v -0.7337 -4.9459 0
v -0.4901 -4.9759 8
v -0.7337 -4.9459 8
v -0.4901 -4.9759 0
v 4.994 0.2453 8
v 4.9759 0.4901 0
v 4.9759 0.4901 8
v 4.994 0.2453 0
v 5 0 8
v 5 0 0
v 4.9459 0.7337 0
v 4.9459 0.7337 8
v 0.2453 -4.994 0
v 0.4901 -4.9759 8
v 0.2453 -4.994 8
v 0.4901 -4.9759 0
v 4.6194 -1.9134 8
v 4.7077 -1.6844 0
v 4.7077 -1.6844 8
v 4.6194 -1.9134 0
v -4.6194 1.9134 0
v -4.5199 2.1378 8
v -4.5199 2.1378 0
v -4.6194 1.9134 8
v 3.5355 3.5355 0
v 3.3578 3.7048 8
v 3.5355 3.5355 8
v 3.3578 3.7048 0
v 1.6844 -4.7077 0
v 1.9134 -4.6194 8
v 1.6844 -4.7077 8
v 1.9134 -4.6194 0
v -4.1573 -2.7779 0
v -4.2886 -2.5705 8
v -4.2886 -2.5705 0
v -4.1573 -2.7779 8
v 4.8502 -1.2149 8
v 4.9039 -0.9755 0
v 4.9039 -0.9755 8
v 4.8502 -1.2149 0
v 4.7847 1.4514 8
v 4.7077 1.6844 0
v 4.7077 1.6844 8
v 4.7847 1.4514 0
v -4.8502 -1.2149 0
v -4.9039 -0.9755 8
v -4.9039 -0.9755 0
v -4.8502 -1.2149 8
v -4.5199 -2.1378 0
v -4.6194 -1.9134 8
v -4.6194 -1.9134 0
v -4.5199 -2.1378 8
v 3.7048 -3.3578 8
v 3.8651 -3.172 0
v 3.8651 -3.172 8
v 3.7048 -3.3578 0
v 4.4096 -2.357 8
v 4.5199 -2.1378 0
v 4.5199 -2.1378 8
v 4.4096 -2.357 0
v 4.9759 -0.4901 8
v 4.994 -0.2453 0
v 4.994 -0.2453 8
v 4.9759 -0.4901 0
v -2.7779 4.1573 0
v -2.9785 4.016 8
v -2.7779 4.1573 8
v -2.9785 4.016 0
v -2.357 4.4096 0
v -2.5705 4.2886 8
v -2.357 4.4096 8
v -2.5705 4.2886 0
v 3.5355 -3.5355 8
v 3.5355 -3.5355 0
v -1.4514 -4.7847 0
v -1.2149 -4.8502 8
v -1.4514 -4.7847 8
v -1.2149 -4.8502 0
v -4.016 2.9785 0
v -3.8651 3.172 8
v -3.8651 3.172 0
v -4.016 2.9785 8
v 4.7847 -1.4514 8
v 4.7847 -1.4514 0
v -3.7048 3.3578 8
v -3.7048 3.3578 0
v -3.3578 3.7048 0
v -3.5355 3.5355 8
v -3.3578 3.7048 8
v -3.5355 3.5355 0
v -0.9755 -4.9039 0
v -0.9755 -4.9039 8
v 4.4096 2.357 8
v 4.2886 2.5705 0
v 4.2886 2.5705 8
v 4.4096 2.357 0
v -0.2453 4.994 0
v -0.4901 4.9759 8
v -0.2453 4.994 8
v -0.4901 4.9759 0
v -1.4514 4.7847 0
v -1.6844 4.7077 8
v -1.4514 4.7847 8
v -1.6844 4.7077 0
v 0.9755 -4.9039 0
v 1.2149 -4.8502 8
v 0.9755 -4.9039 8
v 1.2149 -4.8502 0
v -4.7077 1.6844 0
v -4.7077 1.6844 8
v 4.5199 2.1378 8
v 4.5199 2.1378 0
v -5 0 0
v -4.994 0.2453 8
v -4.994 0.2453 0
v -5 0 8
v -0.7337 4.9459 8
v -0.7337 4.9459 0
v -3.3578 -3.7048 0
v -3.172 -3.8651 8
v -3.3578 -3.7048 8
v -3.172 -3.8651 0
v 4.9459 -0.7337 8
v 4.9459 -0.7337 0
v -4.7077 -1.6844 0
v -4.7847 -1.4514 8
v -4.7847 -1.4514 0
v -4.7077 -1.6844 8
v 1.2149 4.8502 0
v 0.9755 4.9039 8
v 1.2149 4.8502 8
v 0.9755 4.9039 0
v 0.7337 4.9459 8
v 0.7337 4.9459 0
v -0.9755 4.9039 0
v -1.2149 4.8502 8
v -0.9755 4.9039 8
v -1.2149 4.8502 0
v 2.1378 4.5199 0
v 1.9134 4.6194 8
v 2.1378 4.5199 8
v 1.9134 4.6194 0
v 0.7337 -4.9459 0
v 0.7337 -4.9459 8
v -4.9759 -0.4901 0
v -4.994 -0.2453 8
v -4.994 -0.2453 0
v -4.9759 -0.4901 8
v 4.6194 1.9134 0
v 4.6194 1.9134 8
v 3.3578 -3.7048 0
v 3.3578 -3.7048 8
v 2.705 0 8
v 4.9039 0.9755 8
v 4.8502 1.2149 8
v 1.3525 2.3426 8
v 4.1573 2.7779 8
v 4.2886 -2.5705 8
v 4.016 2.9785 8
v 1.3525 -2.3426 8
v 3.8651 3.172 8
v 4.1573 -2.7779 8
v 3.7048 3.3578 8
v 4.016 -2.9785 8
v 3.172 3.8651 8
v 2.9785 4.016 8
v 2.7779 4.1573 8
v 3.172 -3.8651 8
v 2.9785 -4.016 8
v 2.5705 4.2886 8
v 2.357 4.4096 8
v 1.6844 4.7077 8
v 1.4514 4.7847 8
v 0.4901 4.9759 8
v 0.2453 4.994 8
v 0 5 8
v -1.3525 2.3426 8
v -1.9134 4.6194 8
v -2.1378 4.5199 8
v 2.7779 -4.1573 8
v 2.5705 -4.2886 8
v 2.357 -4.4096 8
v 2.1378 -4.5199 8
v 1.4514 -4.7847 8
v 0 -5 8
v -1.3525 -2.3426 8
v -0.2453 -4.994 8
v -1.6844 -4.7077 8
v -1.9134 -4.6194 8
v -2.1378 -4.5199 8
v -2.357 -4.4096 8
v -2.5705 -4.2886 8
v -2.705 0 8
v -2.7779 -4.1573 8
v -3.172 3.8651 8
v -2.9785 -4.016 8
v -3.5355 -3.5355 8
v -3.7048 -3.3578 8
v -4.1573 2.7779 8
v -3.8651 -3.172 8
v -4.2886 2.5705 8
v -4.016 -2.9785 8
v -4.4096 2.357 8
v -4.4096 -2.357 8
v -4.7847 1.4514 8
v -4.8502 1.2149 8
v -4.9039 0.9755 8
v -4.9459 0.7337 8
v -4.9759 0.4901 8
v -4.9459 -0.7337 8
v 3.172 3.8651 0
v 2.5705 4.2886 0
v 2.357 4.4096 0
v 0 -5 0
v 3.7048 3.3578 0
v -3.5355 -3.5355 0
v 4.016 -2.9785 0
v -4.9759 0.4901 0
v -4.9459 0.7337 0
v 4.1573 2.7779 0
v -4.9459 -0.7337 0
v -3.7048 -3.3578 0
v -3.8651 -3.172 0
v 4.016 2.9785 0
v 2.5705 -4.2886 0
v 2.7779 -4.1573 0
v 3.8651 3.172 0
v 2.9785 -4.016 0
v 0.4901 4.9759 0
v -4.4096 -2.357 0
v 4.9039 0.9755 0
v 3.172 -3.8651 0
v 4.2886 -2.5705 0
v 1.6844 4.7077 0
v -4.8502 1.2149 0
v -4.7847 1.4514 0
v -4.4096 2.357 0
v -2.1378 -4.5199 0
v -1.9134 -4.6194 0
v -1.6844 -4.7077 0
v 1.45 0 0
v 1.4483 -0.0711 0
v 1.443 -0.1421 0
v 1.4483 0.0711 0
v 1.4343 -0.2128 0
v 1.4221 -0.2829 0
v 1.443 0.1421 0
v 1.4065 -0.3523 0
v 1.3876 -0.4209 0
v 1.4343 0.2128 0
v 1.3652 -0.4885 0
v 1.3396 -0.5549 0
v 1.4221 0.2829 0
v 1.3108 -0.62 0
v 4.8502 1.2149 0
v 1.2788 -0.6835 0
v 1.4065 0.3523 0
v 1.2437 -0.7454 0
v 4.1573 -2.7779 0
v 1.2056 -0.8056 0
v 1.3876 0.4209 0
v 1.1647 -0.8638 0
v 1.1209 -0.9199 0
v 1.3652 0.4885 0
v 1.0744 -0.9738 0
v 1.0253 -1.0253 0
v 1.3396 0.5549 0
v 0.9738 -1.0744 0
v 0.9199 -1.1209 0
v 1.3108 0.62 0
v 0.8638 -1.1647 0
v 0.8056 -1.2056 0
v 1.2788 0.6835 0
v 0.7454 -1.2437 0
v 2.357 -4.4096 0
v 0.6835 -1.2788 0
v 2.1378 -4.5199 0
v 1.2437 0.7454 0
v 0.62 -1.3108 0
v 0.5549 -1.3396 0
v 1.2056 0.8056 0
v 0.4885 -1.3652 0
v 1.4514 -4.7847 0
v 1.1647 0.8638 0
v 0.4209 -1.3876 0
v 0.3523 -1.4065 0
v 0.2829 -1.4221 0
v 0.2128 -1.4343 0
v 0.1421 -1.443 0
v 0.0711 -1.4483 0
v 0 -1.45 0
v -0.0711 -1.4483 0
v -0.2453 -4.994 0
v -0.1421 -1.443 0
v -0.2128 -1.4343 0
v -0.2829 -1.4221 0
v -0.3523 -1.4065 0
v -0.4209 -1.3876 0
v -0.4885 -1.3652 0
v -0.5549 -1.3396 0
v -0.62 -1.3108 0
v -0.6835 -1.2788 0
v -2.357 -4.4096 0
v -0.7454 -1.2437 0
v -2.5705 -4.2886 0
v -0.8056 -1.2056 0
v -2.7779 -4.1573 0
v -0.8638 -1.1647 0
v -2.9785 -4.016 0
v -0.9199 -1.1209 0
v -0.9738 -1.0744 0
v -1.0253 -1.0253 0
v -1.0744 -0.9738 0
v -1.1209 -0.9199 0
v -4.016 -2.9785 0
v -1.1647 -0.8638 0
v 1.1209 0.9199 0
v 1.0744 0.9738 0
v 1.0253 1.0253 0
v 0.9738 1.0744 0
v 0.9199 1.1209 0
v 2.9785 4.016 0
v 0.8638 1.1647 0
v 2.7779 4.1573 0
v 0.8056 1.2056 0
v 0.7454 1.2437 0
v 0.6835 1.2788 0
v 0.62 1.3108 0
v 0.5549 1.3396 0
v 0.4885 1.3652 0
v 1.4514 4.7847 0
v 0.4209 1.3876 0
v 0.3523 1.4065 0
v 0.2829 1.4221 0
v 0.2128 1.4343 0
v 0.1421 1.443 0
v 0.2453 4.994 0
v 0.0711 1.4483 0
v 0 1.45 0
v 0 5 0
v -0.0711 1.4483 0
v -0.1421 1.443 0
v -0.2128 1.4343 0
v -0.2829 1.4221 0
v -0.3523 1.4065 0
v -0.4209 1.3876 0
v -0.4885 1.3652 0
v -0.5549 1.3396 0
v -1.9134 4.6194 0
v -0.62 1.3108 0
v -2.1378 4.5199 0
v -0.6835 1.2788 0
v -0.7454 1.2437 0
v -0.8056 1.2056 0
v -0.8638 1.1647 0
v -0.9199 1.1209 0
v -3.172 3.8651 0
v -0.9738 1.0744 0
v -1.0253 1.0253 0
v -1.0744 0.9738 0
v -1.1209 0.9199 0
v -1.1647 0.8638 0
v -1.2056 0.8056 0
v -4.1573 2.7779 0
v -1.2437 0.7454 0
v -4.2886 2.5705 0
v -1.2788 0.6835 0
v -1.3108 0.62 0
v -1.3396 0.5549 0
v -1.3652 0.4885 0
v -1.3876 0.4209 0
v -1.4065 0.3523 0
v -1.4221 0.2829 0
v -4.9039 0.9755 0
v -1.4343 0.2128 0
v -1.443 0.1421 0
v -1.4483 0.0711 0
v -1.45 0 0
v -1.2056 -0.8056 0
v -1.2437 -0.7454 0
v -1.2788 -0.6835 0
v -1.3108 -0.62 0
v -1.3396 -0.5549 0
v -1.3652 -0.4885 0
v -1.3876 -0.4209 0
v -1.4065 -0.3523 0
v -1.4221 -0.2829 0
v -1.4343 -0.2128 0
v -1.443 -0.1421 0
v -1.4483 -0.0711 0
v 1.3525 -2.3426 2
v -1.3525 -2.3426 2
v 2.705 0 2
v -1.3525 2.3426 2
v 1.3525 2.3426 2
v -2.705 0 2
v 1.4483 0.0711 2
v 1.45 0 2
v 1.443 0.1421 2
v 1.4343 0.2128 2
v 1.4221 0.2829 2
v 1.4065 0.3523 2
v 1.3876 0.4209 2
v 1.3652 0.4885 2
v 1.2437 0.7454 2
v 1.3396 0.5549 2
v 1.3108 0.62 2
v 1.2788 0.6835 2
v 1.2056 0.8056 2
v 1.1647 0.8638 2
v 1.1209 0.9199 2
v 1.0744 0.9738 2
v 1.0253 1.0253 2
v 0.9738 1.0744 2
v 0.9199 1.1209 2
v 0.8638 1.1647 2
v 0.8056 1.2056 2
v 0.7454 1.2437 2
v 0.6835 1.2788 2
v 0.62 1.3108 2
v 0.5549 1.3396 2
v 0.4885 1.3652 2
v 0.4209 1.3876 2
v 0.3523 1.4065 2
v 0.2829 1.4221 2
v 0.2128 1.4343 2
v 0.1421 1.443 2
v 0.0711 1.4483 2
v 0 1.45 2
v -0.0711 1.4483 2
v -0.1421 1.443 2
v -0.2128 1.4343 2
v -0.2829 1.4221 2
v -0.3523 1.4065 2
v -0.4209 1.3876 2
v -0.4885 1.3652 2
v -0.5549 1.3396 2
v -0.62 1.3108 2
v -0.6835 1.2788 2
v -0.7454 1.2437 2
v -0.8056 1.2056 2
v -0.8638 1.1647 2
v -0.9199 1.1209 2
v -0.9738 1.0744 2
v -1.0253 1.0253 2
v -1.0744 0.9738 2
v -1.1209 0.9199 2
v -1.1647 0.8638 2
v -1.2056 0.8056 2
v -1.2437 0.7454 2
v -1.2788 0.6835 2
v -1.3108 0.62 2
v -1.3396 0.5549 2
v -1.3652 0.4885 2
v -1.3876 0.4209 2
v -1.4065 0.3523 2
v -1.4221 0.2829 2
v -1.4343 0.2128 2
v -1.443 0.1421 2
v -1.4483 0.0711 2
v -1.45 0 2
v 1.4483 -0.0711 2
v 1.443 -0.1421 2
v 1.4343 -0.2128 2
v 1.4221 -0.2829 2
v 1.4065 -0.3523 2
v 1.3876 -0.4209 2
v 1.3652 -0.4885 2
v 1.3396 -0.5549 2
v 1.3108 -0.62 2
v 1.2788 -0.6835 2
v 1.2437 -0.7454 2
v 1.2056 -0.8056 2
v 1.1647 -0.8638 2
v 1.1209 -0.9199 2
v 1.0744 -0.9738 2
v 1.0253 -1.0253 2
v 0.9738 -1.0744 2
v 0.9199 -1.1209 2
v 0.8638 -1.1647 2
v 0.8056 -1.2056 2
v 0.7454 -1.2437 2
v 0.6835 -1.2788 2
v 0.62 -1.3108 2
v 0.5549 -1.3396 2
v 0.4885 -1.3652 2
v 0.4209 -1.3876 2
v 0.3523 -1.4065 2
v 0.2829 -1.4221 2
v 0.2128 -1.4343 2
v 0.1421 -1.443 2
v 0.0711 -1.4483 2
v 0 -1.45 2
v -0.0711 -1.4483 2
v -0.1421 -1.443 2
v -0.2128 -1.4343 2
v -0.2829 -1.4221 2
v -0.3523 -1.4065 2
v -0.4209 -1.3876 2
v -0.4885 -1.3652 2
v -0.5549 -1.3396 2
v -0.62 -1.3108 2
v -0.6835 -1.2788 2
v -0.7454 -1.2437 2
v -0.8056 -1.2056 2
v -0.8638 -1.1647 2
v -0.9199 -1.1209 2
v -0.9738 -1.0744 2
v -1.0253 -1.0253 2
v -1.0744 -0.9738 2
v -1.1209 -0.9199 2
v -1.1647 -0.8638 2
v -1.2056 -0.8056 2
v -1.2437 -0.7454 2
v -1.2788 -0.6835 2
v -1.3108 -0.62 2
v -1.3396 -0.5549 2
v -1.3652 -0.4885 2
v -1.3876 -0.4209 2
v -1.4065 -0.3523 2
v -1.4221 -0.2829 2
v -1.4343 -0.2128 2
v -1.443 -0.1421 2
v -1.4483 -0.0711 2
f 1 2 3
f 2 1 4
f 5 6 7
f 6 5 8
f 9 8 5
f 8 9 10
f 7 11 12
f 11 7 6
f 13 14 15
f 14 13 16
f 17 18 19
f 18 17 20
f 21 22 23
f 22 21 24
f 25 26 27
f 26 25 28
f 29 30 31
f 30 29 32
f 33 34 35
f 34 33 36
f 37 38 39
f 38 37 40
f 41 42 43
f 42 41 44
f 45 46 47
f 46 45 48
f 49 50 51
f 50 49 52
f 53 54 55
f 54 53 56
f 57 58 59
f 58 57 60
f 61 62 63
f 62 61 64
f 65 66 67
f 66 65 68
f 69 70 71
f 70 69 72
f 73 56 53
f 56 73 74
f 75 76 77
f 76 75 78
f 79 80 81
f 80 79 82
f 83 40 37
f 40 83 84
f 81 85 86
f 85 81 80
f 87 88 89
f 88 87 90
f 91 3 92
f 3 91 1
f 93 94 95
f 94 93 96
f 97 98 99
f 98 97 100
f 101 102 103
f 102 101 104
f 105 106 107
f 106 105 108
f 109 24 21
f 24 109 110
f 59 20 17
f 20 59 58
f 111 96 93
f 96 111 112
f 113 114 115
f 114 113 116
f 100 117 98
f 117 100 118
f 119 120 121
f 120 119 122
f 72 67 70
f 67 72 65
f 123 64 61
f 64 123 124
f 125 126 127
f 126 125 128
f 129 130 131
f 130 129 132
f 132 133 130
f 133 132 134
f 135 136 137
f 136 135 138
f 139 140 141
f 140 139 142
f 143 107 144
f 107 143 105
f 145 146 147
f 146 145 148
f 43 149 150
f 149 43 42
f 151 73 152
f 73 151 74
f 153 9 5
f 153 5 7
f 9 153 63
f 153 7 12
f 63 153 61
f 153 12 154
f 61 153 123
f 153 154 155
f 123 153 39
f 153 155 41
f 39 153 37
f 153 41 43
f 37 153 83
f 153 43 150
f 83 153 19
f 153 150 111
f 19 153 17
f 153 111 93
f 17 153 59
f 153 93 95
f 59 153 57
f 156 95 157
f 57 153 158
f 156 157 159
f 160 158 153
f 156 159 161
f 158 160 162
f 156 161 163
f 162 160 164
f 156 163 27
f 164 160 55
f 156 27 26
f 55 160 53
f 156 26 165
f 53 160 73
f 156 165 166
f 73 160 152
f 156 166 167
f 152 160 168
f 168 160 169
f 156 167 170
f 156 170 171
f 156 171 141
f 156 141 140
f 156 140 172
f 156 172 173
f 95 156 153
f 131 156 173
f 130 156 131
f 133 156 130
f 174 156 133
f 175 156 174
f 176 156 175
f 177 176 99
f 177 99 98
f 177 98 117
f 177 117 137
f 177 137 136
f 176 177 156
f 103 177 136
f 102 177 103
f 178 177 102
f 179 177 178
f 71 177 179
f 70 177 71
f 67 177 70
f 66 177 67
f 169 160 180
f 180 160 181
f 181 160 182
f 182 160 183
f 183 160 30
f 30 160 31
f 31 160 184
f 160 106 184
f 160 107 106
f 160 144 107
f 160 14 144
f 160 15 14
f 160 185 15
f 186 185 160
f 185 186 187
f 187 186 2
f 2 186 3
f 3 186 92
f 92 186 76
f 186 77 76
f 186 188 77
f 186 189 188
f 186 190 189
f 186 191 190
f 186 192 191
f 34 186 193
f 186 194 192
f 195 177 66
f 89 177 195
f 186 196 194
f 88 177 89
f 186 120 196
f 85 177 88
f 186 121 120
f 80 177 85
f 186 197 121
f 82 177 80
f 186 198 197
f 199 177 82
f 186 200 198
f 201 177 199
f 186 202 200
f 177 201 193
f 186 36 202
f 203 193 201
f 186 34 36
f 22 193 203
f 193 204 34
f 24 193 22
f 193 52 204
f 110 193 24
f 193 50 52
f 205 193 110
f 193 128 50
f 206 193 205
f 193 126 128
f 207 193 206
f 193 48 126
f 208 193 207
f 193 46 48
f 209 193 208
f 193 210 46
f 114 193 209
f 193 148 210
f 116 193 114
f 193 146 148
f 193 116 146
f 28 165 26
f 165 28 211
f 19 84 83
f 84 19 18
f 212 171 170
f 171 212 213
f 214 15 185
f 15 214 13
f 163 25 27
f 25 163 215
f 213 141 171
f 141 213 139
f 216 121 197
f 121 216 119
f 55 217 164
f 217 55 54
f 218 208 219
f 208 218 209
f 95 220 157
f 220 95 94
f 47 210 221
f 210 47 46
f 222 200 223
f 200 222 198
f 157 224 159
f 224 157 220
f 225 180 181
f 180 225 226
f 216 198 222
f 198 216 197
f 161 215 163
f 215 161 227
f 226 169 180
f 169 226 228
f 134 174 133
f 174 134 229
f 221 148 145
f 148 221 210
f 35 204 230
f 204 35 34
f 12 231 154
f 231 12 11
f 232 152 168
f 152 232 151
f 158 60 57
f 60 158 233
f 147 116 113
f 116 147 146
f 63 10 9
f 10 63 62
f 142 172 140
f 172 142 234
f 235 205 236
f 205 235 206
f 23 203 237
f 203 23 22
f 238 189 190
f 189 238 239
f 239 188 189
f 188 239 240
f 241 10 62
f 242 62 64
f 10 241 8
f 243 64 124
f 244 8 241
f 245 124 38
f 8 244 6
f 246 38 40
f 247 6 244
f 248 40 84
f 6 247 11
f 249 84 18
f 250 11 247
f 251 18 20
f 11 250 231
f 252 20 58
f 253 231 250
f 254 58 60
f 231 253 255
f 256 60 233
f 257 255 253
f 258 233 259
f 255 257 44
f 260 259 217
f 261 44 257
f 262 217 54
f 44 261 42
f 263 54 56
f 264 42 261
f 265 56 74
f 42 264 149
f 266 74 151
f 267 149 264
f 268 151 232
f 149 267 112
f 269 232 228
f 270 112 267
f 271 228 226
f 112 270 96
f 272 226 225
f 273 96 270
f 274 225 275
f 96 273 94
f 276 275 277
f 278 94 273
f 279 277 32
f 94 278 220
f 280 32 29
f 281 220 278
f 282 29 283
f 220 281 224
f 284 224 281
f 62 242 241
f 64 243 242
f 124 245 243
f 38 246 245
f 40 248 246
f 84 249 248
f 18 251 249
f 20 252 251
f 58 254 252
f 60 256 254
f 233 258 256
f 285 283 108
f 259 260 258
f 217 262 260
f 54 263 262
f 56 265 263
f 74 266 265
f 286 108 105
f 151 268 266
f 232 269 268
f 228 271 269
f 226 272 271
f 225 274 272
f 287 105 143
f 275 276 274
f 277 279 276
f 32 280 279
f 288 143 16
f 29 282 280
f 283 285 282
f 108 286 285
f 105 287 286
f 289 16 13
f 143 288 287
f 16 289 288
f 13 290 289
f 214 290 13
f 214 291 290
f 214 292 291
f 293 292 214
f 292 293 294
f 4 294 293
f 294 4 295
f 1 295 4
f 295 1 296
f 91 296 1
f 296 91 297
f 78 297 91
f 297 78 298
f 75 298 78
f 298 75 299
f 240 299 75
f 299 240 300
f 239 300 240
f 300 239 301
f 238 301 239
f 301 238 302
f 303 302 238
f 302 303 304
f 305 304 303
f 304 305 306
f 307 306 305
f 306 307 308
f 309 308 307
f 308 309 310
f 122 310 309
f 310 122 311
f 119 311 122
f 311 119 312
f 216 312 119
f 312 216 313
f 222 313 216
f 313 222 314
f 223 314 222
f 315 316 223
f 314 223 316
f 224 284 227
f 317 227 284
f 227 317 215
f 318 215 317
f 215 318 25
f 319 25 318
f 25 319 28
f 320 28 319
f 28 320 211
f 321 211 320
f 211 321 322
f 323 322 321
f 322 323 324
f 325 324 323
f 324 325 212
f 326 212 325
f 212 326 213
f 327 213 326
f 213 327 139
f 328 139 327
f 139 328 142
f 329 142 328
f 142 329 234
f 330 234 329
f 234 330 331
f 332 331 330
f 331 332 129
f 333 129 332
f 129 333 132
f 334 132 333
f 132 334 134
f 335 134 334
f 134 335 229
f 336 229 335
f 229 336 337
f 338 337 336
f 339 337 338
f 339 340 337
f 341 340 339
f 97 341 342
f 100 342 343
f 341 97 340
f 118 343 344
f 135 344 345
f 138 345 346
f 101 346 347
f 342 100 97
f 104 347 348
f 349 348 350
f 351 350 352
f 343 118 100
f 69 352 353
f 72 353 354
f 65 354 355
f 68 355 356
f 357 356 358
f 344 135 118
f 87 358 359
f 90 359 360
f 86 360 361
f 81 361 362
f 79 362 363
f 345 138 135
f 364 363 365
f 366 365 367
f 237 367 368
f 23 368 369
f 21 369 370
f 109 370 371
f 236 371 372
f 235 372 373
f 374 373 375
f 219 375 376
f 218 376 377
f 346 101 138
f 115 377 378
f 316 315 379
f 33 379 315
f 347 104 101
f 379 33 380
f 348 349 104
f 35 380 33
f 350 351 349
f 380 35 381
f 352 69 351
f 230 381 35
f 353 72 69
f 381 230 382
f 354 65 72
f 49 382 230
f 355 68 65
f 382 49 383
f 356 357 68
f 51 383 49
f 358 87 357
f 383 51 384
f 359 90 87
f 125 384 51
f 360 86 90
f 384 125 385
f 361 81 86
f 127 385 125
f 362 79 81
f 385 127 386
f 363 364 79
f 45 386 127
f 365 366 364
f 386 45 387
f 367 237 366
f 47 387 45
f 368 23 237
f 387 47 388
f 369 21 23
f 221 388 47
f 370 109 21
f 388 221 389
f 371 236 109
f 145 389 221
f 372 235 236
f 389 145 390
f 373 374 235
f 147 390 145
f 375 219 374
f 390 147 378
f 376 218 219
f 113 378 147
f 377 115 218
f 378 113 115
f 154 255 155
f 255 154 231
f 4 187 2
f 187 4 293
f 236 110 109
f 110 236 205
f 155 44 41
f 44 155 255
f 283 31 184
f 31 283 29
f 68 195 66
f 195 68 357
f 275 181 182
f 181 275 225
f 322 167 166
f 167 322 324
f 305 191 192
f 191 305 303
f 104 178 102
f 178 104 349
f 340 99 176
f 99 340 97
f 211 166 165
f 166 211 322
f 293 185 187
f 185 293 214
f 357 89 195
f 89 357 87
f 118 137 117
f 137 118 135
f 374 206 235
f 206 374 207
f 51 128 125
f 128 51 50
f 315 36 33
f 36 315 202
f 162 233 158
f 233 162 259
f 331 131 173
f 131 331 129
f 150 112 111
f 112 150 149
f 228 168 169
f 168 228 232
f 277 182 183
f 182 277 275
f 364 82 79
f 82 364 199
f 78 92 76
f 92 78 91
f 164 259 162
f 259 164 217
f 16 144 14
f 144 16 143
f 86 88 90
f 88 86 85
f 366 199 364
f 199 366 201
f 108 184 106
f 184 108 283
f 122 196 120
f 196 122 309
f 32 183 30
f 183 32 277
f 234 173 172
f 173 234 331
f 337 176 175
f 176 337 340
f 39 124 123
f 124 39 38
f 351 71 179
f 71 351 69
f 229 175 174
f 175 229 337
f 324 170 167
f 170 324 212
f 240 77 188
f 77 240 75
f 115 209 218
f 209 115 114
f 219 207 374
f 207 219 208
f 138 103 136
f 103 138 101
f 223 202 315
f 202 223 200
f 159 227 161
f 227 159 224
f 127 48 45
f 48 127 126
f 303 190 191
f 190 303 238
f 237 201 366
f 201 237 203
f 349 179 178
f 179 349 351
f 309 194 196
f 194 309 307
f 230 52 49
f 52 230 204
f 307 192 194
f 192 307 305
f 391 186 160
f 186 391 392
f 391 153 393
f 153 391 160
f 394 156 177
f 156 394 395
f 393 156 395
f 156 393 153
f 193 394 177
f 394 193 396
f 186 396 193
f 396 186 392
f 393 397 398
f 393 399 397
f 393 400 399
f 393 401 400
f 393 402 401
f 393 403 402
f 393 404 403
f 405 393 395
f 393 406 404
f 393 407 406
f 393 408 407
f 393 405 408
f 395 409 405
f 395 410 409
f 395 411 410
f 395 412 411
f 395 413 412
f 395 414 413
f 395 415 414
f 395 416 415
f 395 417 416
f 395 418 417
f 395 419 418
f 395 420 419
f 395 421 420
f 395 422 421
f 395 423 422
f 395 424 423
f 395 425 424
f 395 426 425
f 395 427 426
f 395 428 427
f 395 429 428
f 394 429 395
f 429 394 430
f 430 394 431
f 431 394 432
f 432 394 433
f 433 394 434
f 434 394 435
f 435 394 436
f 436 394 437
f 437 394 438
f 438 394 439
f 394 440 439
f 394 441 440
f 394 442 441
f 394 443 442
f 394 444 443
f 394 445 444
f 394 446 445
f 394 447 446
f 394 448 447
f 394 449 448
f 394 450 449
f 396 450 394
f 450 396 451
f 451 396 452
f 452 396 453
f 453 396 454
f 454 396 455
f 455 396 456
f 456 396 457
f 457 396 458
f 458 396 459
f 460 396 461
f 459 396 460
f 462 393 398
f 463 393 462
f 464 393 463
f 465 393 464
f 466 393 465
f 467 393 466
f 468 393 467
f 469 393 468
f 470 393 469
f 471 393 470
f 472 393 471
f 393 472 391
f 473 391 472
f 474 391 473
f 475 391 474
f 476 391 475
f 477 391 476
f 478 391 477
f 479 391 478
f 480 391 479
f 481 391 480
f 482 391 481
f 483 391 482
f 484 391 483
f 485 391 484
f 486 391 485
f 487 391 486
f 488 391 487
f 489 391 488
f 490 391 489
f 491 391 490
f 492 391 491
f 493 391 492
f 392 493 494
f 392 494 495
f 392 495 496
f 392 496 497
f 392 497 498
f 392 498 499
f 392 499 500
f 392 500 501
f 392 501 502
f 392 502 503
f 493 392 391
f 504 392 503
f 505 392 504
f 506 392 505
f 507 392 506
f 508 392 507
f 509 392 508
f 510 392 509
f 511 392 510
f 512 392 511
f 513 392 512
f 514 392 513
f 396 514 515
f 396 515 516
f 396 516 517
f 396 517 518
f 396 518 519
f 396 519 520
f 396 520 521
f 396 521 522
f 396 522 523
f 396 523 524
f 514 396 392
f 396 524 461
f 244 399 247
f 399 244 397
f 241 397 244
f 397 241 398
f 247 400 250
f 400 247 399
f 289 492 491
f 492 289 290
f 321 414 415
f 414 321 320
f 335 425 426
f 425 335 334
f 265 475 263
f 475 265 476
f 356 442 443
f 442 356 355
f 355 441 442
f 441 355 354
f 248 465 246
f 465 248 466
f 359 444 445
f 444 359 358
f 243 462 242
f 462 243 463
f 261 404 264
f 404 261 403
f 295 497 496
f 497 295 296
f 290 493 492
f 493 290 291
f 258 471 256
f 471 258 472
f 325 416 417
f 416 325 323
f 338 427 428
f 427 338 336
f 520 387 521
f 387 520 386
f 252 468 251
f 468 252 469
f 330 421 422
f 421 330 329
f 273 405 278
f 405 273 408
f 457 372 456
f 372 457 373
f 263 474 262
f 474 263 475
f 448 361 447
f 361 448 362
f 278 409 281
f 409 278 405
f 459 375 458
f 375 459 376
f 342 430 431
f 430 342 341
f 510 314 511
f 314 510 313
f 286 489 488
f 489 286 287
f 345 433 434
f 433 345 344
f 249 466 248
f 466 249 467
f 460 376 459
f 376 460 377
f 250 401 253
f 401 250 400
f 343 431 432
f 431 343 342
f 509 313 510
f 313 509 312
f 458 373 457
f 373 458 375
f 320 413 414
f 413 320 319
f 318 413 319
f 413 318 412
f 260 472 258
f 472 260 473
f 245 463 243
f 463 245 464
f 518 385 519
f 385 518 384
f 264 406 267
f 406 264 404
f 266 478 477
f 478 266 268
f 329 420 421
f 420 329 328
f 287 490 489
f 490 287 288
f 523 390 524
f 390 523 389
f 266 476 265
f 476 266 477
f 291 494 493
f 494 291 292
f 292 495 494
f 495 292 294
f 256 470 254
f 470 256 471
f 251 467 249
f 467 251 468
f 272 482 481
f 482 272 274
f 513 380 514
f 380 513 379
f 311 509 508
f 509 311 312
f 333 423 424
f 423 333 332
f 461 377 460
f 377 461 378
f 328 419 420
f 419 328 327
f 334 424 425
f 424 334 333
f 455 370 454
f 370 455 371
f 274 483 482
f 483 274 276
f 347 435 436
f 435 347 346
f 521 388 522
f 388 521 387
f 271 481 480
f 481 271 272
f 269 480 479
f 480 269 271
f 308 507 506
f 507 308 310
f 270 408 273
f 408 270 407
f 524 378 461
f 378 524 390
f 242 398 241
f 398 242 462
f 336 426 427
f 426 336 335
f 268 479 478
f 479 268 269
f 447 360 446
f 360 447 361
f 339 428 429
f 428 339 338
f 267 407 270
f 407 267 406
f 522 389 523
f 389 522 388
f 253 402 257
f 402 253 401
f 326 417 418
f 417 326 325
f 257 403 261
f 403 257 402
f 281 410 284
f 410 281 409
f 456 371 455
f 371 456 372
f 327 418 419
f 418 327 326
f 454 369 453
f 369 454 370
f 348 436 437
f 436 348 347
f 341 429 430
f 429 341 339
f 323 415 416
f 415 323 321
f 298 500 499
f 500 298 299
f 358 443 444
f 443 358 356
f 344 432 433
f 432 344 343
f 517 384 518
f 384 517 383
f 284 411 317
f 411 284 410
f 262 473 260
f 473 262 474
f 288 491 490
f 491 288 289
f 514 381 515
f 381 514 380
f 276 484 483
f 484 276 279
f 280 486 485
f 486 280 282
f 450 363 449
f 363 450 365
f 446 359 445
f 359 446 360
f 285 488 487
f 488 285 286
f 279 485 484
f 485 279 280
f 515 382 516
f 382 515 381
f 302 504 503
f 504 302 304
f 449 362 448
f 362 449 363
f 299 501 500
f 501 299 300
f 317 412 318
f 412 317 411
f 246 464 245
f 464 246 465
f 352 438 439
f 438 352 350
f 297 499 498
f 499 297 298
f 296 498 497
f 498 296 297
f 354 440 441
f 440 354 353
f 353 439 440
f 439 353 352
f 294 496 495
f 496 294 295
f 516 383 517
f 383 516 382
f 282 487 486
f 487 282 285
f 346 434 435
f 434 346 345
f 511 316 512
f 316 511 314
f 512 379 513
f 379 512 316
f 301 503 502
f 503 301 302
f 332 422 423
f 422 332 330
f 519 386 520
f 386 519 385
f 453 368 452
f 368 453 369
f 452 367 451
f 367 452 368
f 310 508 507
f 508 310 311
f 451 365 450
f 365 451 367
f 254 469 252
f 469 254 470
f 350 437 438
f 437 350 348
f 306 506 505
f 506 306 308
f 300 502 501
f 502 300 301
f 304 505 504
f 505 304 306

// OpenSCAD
// T2-FEET-10+ snap connectors for tile<->frame attachment
// Copyright (C) 2019 The T2 Tile Project
// Licensed under GPL-3

m3ScrewNominalHoleDiameterMM=3.4 + 0.1;  // According to internet, plus 0.1
m3ScrewNominalHeadDiameterMM=5.5 + 0.2;  // 5.5: socket cap; 5.6: narrow 'cheese head'; 5.7: +socket cap; 6: philips
m3ScrewNominalHeadCountersinkDepthMM=3.0 + 0.1;  // Makes 25mm screw into 28mm

m3ScrewNominalThreadOuterDiameterMM=2.9; // Outer edge of thread
m3ScrewNominalThreadInnerDiameterMM=2.7; // Inner edge of thread

m3NutNominalHeightMM = 2.5;
m3NutNominalDiameterMM = 5.41;

// Parameters
fOuterShellDiameterMM=10;
fOuterShellHeightMM=8;
fOuterShellBaseThicknessMM=2;
fInnerShellDiameterMM=6;

fmDefaultClearanceMM=0.2;

// Derived measurements
m3ScrewNominalHoleRadiusMM=m3ScrewNominalHoleDiameterMM/2;
m3ScrewNominalHeadRadiusMM=m3ScrewNominalHeadDiameterMM/2;

m3ScrewNominalThreadOuterRadiusMM=m3ScrewNominalThreadOuterDiameterMM/2;
m3ScrewNominalThreadInnerRadiusMM=m3ScrewNominalThreadInnerDiameterMM/2;

m3NutNominalRadiusMM = m3NutNominalDiameterMM/2;

fOuterShellRadiusMM=fOuterShellDiameterMM/2;
fInnerShellRadiusMM=fInnerShellDiameterMM/2;

module hexNut(removeHole=true) {
     difference() {
          cylinder(h=m3NutNominalHeightMM,
                   r1 = m3NutNominalRadiusMM,
                   r2 = m3NutNominalRadiusMM,
                   center = false,
                   $fn=6);
          cylinder(h=m3NutNominalHeightMM,
                   r1 = m3ScrewNominalThreadRadiusMM,
                   r2 = m3ScrewNominalThreadRadiusMM,
                   $fn=128);
     }
}

module femaleConnector() {
     difference() {
          cylinder(h=fOuterShellHeightMM, r1 = fOuterShellRadiusMM, r2 = fOuterShellRadiusMM, center = false, $fn=128);
          // hex shaft
          translate([0,0,fOuterShellBaseThicknessMM]) {
               cylinder(h=fOuterShellHeightMM-fOuterShellBaseThicknessMM,
                        r1 = m3NutNominalRadiusMM,
                        r2 = m3NutNominalRadiusMM,
                        center = false,
                        $fn=6);
          }

          // screw shaft
               cylinder(h=fOuterShellBaseThicknessMM,
                        r1 = m3ScrewNominalThreadOuterRadiusMM,
                        r2 = m3ScrewNominalThreadOuterRadiusMM,
                        center = false,
                        $fn=128);
     }
}

femaleConnector();
